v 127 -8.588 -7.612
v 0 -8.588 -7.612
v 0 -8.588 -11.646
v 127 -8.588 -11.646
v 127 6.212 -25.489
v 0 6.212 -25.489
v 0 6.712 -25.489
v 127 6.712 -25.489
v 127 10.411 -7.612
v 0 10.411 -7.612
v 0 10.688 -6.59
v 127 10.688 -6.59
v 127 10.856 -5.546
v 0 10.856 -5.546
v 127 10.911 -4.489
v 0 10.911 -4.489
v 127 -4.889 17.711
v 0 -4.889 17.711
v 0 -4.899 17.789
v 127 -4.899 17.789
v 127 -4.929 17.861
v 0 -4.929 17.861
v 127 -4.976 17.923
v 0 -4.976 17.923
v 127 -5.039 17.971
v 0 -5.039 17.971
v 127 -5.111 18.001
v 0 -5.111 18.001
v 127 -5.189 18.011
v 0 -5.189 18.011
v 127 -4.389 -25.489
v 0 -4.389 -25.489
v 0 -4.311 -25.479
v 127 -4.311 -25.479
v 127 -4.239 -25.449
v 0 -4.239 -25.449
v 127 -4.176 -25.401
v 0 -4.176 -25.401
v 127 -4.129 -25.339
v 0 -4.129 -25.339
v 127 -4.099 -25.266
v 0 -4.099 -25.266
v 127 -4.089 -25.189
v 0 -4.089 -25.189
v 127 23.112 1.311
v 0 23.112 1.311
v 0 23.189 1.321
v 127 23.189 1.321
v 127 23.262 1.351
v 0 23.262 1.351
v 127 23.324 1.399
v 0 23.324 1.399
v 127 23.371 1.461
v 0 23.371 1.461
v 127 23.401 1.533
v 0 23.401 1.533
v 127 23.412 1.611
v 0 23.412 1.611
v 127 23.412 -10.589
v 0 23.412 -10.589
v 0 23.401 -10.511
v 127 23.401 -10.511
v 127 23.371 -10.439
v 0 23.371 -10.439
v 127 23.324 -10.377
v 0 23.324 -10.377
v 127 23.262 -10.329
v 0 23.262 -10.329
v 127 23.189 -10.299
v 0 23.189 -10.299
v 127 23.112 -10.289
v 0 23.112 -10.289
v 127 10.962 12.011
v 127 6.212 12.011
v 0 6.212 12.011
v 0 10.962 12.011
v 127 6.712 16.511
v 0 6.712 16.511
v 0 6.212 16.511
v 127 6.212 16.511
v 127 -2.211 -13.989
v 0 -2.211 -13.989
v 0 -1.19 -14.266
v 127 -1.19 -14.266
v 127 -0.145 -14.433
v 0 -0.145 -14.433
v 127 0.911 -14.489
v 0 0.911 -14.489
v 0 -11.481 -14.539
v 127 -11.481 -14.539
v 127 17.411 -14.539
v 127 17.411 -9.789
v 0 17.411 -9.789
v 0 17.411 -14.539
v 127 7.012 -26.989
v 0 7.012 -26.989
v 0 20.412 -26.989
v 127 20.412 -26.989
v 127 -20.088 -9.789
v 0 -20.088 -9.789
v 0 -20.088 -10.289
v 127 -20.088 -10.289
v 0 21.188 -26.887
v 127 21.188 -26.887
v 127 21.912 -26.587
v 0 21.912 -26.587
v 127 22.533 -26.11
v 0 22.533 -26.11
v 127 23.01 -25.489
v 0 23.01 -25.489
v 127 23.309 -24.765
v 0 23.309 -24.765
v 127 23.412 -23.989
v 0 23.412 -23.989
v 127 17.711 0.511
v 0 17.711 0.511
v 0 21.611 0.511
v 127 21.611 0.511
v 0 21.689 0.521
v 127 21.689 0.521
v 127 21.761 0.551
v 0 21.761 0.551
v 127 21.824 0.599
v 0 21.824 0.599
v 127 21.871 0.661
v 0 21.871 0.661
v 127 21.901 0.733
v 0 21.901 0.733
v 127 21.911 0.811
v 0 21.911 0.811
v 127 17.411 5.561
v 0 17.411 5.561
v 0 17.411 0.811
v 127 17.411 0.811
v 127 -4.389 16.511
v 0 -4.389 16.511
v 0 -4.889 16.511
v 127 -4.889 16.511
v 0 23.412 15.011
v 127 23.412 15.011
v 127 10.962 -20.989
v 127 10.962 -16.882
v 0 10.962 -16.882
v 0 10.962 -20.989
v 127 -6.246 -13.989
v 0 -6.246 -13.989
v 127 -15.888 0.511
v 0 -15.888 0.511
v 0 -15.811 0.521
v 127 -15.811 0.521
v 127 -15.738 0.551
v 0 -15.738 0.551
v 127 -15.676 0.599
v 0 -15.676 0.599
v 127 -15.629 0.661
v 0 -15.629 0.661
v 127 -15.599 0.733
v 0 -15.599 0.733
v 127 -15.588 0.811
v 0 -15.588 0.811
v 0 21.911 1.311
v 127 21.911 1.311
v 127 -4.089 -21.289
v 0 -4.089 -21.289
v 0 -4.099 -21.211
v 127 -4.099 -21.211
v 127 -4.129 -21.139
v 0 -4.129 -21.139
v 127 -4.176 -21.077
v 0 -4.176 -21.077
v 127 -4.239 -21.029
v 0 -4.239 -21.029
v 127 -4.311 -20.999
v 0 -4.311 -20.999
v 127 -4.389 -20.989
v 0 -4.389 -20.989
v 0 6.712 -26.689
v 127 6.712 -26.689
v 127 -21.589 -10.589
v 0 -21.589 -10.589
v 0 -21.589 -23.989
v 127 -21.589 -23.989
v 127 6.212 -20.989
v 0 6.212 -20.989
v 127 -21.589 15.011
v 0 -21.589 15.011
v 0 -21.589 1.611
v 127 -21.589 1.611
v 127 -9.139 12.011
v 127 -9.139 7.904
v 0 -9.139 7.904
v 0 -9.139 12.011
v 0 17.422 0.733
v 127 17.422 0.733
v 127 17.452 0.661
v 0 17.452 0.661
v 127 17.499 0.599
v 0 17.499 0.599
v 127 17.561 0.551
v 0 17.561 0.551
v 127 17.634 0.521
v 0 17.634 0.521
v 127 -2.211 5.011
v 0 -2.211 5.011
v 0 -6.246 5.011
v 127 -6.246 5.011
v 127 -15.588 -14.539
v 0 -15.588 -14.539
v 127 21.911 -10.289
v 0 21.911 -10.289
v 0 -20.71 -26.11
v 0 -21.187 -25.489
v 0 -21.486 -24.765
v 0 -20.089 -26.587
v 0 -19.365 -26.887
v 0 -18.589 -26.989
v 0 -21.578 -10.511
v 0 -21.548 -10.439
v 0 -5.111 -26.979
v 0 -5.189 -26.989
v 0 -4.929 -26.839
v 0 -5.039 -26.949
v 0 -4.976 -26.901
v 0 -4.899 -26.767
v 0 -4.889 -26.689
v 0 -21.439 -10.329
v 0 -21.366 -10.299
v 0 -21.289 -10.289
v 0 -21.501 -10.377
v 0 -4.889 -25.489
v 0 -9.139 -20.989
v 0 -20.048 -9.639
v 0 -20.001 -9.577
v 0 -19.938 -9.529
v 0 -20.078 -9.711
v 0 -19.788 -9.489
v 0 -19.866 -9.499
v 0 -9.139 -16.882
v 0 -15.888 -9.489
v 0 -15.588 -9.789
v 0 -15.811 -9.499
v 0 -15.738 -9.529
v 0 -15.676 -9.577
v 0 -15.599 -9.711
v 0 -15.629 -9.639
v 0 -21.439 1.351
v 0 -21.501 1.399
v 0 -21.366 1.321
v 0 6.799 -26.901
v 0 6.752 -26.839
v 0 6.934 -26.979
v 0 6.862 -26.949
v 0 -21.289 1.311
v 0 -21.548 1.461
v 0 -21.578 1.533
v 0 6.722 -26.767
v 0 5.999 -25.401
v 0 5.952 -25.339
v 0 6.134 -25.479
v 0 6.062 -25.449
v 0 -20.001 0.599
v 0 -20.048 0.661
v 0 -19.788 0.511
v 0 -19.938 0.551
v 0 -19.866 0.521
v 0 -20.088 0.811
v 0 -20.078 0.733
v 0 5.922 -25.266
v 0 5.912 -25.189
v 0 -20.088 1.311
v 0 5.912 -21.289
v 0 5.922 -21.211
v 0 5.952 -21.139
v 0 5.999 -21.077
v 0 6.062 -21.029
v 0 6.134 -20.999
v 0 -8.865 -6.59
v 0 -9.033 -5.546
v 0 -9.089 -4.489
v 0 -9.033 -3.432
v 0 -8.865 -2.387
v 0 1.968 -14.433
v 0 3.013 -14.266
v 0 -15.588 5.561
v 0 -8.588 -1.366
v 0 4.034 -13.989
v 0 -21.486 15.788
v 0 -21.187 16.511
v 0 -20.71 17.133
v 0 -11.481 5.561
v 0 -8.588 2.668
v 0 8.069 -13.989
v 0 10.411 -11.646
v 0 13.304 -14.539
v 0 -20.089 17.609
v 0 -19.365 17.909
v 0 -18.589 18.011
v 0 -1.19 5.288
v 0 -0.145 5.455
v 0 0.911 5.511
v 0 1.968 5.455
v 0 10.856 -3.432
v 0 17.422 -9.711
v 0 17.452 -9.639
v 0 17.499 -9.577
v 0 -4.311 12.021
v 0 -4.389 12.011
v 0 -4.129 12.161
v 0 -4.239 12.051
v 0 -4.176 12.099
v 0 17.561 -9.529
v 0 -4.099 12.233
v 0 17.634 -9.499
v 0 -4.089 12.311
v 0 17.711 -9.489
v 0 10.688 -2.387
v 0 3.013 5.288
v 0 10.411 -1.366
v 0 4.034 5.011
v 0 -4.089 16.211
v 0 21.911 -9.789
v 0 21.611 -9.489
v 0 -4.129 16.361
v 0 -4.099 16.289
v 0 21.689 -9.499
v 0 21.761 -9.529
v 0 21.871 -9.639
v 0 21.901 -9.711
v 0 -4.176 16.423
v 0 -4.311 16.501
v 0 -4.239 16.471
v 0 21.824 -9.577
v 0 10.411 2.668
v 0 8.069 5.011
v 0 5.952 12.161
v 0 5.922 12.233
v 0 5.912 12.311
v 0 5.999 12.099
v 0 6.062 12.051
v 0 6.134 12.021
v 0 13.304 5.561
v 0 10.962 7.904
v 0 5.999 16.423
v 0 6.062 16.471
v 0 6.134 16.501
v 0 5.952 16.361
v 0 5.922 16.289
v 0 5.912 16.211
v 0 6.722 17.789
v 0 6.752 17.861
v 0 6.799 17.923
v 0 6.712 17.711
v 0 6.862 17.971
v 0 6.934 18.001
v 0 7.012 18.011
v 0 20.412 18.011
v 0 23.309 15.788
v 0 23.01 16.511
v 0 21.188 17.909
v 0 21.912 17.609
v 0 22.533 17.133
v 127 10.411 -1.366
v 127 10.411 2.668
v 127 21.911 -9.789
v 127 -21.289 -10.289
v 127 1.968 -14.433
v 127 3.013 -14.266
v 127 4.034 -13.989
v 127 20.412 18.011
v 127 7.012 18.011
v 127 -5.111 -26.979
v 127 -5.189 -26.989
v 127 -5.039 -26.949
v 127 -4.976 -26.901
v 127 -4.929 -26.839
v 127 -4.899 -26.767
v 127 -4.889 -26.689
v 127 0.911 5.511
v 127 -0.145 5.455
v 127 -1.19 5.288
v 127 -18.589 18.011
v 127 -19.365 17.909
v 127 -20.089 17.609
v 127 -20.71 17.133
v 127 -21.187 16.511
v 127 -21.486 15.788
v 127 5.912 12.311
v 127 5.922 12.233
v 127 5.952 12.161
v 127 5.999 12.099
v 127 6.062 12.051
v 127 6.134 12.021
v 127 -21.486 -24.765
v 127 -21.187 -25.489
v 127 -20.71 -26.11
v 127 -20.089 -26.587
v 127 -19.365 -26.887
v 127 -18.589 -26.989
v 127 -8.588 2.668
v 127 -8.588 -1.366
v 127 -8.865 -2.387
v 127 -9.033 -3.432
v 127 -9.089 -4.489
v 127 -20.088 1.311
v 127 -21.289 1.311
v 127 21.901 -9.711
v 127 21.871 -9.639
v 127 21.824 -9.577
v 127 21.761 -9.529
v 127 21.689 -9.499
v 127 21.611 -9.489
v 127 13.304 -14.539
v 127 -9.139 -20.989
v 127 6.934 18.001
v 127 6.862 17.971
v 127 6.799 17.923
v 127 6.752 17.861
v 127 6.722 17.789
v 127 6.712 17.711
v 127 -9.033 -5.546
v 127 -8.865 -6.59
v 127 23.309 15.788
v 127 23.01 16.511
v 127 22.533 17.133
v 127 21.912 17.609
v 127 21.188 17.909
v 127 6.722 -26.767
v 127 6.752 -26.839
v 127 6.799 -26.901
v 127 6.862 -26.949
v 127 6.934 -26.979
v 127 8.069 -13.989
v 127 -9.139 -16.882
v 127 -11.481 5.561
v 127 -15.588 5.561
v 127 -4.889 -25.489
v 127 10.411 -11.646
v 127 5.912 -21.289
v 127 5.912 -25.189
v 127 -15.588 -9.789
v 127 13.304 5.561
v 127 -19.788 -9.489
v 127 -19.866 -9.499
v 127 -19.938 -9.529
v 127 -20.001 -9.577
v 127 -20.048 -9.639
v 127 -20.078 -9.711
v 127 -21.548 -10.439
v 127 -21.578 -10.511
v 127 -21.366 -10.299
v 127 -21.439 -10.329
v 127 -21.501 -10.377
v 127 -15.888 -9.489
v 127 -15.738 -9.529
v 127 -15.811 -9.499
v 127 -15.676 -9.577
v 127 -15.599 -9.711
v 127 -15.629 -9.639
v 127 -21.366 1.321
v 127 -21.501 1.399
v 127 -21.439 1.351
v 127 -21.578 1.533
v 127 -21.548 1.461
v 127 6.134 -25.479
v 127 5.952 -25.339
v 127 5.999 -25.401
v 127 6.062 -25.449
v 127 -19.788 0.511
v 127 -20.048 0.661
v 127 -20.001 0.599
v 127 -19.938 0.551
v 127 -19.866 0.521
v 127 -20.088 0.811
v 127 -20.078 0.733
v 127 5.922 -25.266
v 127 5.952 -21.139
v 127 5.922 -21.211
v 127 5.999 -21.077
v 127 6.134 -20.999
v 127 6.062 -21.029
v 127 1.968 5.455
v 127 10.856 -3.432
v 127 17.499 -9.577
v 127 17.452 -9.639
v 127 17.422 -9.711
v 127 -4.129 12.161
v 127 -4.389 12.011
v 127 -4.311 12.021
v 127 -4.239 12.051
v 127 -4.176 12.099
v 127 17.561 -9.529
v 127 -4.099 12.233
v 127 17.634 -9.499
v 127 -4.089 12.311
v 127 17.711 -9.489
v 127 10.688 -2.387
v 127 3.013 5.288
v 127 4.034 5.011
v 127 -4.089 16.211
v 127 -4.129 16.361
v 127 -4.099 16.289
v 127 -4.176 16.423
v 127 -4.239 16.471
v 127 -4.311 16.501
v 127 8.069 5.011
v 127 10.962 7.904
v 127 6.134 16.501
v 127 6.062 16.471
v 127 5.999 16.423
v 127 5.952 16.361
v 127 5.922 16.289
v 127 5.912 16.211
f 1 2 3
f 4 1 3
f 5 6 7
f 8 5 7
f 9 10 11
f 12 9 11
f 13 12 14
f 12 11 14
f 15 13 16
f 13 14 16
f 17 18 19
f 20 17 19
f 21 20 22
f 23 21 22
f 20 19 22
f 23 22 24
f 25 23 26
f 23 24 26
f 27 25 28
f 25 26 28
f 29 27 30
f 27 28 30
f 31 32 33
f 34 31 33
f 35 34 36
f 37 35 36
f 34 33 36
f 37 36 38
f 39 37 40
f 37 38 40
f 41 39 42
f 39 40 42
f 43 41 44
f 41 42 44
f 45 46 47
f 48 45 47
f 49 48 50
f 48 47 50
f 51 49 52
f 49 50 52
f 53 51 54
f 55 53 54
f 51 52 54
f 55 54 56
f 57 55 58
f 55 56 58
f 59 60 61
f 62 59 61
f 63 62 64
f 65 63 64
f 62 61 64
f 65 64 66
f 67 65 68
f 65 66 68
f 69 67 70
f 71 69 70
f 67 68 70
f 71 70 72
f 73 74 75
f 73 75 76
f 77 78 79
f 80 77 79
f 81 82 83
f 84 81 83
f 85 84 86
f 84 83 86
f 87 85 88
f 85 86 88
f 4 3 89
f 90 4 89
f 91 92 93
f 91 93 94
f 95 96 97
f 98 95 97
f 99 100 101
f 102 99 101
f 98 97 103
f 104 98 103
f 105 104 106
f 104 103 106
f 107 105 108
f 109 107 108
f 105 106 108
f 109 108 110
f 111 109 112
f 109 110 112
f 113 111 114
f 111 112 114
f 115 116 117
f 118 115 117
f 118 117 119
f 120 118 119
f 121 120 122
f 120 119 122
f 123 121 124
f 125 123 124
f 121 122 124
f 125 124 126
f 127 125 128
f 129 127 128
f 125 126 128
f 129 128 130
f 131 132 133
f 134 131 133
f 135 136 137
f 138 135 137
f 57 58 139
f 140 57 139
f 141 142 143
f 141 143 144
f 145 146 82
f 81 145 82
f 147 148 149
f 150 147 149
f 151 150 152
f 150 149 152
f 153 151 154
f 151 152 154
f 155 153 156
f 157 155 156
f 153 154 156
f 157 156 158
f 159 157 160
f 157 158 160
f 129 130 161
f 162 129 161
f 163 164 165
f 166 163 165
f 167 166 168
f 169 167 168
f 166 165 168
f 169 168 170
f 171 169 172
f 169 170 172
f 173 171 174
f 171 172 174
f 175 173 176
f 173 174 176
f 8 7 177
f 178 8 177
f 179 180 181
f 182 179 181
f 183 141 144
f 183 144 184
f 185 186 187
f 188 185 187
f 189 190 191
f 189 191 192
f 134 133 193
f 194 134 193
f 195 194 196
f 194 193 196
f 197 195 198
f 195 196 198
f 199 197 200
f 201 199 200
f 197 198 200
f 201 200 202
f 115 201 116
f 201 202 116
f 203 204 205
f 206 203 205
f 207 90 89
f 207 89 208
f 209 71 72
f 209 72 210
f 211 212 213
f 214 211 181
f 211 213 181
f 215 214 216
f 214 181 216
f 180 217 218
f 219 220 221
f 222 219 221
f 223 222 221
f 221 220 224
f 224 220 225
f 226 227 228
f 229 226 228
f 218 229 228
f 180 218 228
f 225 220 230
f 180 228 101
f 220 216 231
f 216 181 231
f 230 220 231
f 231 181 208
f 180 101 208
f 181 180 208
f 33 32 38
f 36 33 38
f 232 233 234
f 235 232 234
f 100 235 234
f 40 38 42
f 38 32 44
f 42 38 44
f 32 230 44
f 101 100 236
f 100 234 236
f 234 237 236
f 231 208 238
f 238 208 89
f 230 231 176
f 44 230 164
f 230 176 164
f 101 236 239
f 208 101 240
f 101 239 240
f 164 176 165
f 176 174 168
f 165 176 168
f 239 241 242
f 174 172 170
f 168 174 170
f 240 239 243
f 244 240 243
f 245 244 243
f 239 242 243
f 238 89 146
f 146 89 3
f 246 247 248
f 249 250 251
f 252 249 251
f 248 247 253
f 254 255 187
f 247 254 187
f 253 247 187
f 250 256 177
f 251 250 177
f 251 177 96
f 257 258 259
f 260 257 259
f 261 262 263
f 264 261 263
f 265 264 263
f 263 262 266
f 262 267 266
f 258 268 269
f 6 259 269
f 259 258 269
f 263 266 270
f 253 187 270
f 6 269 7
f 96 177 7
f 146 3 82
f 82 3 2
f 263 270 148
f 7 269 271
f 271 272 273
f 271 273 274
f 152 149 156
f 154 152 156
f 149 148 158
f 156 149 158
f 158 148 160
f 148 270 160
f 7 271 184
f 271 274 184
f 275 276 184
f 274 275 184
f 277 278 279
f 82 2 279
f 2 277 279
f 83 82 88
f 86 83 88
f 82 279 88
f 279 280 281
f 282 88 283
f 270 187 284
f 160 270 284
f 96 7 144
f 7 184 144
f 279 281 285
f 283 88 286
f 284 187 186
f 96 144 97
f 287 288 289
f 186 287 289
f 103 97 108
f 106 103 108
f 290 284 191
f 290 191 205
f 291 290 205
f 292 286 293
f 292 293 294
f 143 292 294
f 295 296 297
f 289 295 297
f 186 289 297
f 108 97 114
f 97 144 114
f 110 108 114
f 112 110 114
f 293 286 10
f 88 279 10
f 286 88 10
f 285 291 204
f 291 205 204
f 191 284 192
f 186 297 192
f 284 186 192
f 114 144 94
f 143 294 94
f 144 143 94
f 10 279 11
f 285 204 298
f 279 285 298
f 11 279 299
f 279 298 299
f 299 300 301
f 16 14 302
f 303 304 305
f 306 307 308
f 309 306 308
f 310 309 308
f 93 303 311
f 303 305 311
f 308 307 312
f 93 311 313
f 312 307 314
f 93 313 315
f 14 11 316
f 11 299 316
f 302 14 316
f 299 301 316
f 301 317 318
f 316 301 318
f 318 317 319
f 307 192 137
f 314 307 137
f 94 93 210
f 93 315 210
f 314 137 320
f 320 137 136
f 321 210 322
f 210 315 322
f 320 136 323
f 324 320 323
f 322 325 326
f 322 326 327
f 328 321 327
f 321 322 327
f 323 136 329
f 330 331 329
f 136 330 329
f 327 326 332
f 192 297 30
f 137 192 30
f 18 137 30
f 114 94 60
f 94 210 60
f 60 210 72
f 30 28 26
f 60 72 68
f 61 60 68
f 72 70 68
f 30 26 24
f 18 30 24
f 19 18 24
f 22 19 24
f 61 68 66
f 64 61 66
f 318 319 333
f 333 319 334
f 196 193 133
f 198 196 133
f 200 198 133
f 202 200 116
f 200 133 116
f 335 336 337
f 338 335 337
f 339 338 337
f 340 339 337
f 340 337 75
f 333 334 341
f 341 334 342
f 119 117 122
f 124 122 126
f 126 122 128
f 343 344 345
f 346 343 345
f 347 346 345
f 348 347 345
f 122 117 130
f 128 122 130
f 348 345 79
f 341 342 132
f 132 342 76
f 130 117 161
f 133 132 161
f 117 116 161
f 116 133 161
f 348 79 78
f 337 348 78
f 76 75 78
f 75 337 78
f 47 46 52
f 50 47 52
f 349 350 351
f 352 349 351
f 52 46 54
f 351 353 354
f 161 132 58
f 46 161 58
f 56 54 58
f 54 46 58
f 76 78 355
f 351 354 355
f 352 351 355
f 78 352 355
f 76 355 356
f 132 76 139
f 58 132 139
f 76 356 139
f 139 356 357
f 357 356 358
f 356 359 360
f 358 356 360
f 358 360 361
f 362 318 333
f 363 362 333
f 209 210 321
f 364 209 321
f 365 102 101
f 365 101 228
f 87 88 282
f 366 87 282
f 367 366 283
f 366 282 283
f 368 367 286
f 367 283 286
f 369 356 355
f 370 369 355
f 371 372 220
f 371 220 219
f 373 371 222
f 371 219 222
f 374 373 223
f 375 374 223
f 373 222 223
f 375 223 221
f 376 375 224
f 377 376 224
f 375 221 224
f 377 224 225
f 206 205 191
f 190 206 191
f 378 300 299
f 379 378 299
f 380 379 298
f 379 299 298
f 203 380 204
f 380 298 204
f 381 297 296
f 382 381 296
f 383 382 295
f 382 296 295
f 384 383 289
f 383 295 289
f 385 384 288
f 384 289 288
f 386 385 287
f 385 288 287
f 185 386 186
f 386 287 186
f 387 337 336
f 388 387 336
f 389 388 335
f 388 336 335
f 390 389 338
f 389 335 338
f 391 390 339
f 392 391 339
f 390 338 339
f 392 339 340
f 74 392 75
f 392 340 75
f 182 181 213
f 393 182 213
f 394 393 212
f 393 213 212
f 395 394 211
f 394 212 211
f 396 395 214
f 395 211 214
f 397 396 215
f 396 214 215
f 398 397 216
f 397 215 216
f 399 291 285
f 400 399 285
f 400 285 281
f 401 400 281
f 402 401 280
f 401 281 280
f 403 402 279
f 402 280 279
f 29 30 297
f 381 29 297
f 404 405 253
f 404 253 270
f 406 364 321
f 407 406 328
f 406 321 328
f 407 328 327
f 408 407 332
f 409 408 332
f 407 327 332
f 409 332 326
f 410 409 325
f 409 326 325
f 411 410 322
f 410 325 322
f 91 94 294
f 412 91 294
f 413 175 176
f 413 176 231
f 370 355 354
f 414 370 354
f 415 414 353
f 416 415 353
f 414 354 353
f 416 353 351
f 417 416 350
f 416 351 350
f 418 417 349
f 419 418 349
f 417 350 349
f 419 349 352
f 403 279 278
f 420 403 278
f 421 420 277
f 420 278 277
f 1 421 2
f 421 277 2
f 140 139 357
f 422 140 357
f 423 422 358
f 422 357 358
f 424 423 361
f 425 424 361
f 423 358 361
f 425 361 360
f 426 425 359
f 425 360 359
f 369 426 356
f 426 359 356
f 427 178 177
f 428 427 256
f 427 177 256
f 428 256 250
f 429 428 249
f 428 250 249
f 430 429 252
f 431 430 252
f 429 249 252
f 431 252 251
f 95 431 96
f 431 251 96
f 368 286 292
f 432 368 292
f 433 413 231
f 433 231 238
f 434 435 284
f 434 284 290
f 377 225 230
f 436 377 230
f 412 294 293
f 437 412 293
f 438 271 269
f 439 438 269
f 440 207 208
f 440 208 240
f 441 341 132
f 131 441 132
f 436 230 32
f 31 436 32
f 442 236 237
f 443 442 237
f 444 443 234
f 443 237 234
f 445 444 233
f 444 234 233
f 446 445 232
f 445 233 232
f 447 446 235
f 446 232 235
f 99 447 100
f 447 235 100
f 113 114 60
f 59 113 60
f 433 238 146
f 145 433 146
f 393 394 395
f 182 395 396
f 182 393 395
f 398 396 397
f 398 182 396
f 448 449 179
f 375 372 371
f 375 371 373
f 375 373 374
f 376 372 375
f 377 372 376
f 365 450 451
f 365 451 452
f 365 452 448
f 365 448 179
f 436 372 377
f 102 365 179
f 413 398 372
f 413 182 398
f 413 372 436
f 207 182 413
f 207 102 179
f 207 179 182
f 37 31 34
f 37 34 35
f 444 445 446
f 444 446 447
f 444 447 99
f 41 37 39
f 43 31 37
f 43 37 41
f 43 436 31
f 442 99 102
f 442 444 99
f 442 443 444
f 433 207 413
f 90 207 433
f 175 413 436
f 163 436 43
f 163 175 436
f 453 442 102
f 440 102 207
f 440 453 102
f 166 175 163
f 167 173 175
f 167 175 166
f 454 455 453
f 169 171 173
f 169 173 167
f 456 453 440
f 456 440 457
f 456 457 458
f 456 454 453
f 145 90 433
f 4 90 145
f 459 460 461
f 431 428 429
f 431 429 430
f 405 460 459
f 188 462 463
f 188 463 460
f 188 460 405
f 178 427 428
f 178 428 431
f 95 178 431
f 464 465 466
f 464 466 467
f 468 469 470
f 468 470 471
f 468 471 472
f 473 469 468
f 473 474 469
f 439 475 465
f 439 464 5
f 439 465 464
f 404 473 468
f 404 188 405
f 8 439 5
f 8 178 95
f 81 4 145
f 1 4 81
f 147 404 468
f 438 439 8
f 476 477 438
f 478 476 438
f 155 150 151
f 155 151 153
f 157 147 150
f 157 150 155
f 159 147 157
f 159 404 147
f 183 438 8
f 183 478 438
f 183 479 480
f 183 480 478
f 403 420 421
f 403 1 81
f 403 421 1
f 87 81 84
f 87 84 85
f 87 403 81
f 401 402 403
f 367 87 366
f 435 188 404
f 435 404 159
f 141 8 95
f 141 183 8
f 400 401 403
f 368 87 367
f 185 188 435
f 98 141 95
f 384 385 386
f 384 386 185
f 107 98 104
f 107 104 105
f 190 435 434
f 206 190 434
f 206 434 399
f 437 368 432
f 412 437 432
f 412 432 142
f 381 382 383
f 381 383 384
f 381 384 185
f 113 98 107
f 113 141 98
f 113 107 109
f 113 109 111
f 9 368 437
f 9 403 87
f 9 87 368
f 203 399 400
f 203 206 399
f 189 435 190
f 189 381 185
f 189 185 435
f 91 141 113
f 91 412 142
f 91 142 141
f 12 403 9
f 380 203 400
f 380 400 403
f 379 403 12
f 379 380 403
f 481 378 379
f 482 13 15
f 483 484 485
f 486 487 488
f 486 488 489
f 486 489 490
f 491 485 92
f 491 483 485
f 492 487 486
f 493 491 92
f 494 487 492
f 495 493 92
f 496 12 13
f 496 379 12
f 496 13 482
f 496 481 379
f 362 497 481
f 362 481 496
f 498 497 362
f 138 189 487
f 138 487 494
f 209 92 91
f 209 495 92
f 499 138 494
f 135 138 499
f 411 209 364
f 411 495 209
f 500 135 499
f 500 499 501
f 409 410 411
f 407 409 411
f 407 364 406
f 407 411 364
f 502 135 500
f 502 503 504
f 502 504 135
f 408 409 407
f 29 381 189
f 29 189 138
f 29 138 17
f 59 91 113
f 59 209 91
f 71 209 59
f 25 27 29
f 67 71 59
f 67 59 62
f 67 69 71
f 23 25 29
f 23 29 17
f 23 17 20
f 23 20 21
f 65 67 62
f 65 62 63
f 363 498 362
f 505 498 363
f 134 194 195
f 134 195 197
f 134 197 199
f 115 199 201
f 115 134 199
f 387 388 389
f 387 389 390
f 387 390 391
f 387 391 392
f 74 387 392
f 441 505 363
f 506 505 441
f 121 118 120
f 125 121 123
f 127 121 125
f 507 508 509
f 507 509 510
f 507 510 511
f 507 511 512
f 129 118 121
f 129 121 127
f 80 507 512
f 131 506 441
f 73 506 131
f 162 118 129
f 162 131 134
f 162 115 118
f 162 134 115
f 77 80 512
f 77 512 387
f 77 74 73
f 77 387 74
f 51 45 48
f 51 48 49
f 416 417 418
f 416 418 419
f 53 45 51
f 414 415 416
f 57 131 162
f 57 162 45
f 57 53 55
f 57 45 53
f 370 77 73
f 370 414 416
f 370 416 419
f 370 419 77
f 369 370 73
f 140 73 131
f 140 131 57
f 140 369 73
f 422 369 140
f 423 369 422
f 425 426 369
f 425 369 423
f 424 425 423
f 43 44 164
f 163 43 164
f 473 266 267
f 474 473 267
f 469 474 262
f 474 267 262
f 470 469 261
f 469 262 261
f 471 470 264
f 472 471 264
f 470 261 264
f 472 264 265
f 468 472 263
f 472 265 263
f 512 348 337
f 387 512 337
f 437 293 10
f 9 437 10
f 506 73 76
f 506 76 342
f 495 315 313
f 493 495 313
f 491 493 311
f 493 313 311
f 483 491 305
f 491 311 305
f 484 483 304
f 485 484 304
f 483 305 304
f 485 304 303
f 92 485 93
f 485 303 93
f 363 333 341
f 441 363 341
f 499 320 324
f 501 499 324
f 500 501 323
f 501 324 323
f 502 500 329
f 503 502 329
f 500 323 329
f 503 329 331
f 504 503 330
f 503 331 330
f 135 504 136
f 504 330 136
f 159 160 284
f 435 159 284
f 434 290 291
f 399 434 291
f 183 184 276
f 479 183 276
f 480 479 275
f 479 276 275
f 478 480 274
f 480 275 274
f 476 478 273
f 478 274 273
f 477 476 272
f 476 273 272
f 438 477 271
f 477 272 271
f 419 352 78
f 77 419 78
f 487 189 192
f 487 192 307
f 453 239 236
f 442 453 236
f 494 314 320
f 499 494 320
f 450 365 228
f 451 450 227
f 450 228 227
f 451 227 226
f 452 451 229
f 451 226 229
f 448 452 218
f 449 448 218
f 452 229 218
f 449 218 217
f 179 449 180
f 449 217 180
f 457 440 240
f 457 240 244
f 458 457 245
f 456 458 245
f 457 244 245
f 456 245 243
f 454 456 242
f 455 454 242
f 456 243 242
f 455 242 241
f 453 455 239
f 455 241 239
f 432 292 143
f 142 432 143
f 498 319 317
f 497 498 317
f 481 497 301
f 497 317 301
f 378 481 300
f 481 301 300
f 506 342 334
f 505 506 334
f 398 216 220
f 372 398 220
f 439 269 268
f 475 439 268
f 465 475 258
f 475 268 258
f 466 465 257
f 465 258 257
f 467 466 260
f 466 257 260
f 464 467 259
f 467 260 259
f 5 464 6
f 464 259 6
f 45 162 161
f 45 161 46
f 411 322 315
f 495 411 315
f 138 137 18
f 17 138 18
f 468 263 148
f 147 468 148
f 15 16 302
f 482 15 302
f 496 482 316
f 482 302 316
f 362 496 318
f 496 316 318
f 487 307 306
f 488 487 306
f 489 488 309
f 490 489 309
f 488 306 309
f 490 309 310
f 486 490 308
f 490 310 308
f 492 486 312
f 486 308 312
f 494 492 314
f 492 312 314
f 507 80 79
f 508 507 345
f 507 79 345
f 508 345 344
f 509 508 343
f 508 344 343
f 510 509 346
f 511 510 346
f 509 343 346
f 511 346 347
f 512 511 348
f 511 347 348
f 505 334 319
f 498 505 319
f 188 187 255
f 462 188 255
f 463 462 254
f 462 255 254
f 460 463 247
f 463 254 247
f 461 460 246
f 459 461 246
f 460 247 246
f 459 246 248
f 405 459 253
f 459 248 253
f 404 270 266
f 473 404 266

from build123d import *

# Parameters (mm, degrees)
F1_DEPTH = 127


with BuildPart() as f1:
    # F0 (on Right) → F1 (new body)
    with BuildSketch(Plane.YZ):
        with BuildLine():
            Line((-20.088481, -9.788837), (-20.088481, -10.288837))
            Line((-20.088481, -10.288837), (-21.28859, -10.288837))
            ThreePointArc((-21.28859, -10.288837), (-21.500722, -10.376705), (-21.58859, -10.588837))
            Line((-21.58859, -10.588837), (-21.58859, -23.988949))
            ThreePointArc((-21.58859, -23.988949), (-20.70991, -26.11027), (-18.58859, -26.988949))
            Line((-18.58859, -26.988949), (-5.188544, -26.988949))
            ThreePointArc((-5.188544, -26.988949), (-4.976411, -26.901081), (-4.888544, -26.688949))
            Line((-4.888544, -26.688949), (-4.888544, -25.488841))
            Line((-4.888544, -25.488841), (-4.388544, -25.488841))
            ThreePointArc((-4.388544, -25.488841), (-4.176411, -25.400973), (-4.088544, -25.188841))
            Line((-4.088544, -25.188841), (-4.088544, -21.288841))
            ThreePointArc((-4.088544, -21.288841), (-4.176411, -21.076709), (-4.388544, -20.988841))
            Line((-4.388544, -20.988841), (-9.138663, -20.988841))
            Line((-9.138663, -20.988841), (-9.138663, -16.881665))
            Line((-9.138663, -16.881665), (-6.245729, -13.988731))
            Line((-6.245729, -13.988731), (-2.211433, -13.988731))
            ThreePointArc((-2.211433, -13.988731), (-0.669869, -14.363044), (0.91149, -14.48887))
            Line((0.91149, -14.48887), (0.91149, -4.48887))
            Line((0.91149, -4.48887), (-9.08851, -4.48887))
            ThreePointArc((-9.08851, -4.48887), (-8.962684, -6.070229), (-8.588371, -7.611793))
            Line((-8.588371, -7.611793), (-8.588371, -11.646022))
            Line((-8.588371, -11.646022), (-11.481305, -14.538956))
            Line((-11.481305, -14.538956), (-15.588481, -14.538956))
            Line((-15.588481, -14.538956), (-15.588481, -9.788837))
            ThreePointArc((-15.588481, -9.788837), (-15.676349, -9.576705), (-15.888481, -9.488837))
            Line((-15.888481, -9.488837), (-19.788481, -9.488837))
            ThreePointArc((-19.788481, -9.488837), (-20.000613, -9.576705), (-20.088481, -9.788837))
        make_face()
        with BuildLine():
            ThreePointArc((-8.588371, -1.365947), (-8.962684, -2.907511), (-9.08851, -4.48887))
            Line((-9.08851, -4.48887), (0.91149, -4.48887))
            Line((0.91149, -4.48887), (0.91149, 5.51113))
            ThreePointArc((0.91149, 5.51113), (-0.669869, 5.385303), (-2.211433, 5.010991))
            Line((-2.211433, 5.010991), (-6.245729, 5.010991))
            Line((-6.245729, 5.010991), (-9.138663, 7.903925))
            Line((-9.138663, 7.903925), (-9.138663, 12.011101))
            Line((-9.138663, 12.011101), (-4.388544, 12.011101))
            ThreePointArc((-4.388544, 12.011101), (-4.176411, 12.098969), (-4.088544, 12.311101))
            Line((-4.088544, 12.311101), (-4.088544, 16.211101))
            ThreePointArc((-4.088544, 16.211101), (-4.176411, 16.423233), (-4.388544, 16.511101))
            Line((-4.388544, 16.511101), (-4.888544, 16.511101))
            Line((-4.888544, 16.511101), (-4.888544, 17.711209))
            ThreePointArc((-4.888544, 17.711209), (-4.976411, 17.923341), (-5.188544, 18.011209))
            Line((-5.188544, 18.011209), (-18.58859, 18.011209))
            ThreePointArc((-18.58859, 18.011209), (-20.70991, 17.13253), (-21.58859, 15.011209))
            Line((-21.58859, 15.011209), (-21.58859, 1.611097))
            ThreePointArc((-21.58859, 1.611097), (-21.500722, 1.398965), (-21.28859, 1.311097))
            Line((-21.28859, 1.311097), (-20.088481, 1.311097))
            Line((-20.088481, 1.311097), (-20.088481, 0.811097))
            ThreePointArc((-20.088481, 0.811097), (-20.000613, 0.598965), (-19.788481, 0.511097))
            Line((-19.788481, 0.511097), (-15.888481, 0.511097))
            ThreePointArc((-15.888481, 0.511097), (-15.676349, 0.598965), (-15.588481, 0.811097))
            Line((-15.588481, 0.811097), (-15.588481, 5.561216))
            Line((-15.588481, 5.561216), (-11.481305, 5.561216))
            Line((-11.481305, 5.561216), (-8.588371, 2.668282))
            Line((-8.588371, 2.668282), (-8.588371, -1.365947))
        make_face()
        with BuildLine():
            Line((0.91149, 5.51113), (0.91149, -4.48887))
            Line((0.91149, -4.48887), (10.91149, -4.48887))
            ThreePointArc((10.91149, -4.48887), (10.785663, -2.907511), (10.41135, -1.365947))
            Line((10.41135, -1.365947), (10.41135, 2.668282))
            Line((10.41135, 2.668282), (13.304285, 5.561216))
            Line((13.304285, 5.561216), (14.016842, 5.561216))
            Line((14.016842, 5.561216), (17.41146, 5.561216))
            Line((17.41146, 5.561216), (17.41146, 0.811097))
            ThreePointArc((17.41146, 0.811097), (17.499328, 0.598965), (17.71146, 0.511097))
            Line((17.71146, 0.511097), (21.61146, 0.511097))
            ThreePointArc((21.61146, 0.511097), (21.823593, 0.598965), (21.91146, 0.811097))
            Line((21.91146, 0.811097), (21.91146, 1.311097))
            Line((21.91146, 1.311097), (23.111569, 1.311097))
            ThreePointArc((23.111569, 1.311097), (23.323701, 1.398965), (23.411569, 1.611097))
            Line((23.411569, 1.611097), (23.411569, 15.011209))
            ThreePointArc((23.411569, 15.011209), (22.532889, 17.13253), (20.411569, 18.011209))
            Line((20.411569, 18.011209), (7.011523, 18.011209))
            ThreePointArc((7.011523, 18.011209), (6.799391, 17.923341), (6.711523, 17.711209))
            Line((6.711523, 17.711209), (6.711523, 16.511101))
            Line((6.711523, 16.511101), (6.211523, 16.511101))
            ThreePointArc((6.211523, 16.511101), (5.999391, 16.423233), (5.911523, 16.211101))
            Line((5.911523, 16.211101), (5.911523, 12.311101))
            ThreePointArc((5.911523, 12.311101), (5.999391, 12.098969), (6.211523, 12.011101))
            Line((6.211523, 12.011101), (10.961642, 12.011101))
            Line((10.961642, 12.011101), (10.961642, 7.903925))
            Line((10.961642, 7.903925), (8.068708, 5.010991))
            Line((8.068708, 5.010991), (4.034413, 5.010991))
            ThreePointArc((4.034413, 5.010991), (2.492849, 5.385303), (0.91149, 5.51113))
        make_face()
        with BuildLine():
            Line((10.91149, -4.48887), (0.91149, -4.48887))
            Line((0.91149, -4.48887), (0.91149, -14.48887))
            ThreePointArc((0.91149, -14.48887), (2.492849, -14.363044), (4.034413, -13.988731))
            Line((4.034413, -13.988731), (8.068708, -13.988731))
            Line((8.068708, -13.988731), (10.961642, -16.881665))
            Line((10.961642, -16.881665), (10.961642, -20.988841))
            Line((10.961642, -20.988841), (6.211523, -20.988841))
            ThreePointArc((6.211523, -20.988841), (5.999391, -21.076709), (5.911523, -21.288841))
            Line((5.911523, -21.288841), (5.911523, -25.188841))
            ThreePointArc((5.911523, -25.188841), (5.999391, -25.400973), (6.211523, -25.488841))
            Line((6.211523, -25.488841), (6.711523, -25.488841))
            Line((6.711523, -25.488841), (6.711523, -26.688949))
            ThreePointArc((6.711523, -26.688949), (6.799391, -26.901081), (7.011523, -26.988949))
            Line((7.011523, -26.988949), (20.411569, -26.988949))
            ThreePointArc((20.411569, -26.988949), (22.532889, -26.11027), (23.411569, -23.988949))
            Line((23.411569, -23.988949), (23.411569, -10.588837))
            ThreePointArc((23.411569, -10.588837), (23.323701, -10.376705), (23.111569, -10.288837))
            Line((23.111569, -10.288837), (21.91146, -10.288837))
            Line((21.91146, -10.288837), (21.91146, -9.788837))
            ThreePointArc((21.91146, -9.788837), (21.823593, -9.576705), (21.61146, -9.488837))
            Line((21.61146, -9.488837), (17.71146, -9.488837))
            ThreePointArc((17.71146, -9.488837), (17.499328, -9.576705), (17.41146, -9.788837))
            Line((17.41146, -9.788837), (17.41146, -14.538956))
            Line((17.41146, -14.538956), (13.304285, -14.538956))
            Line((13.304285, -14.538956), (10.41135, -11.646022))
            Line((10.41135, -11.646022), (10.41135, -7.611793))
            ThreePointArc((10.41135, -7.611793), (10.785663, -6.070229), (10.91149, -4.48887))
        make_face()
    extrude(amount=F1_DEPTH)


solid = f1.part
